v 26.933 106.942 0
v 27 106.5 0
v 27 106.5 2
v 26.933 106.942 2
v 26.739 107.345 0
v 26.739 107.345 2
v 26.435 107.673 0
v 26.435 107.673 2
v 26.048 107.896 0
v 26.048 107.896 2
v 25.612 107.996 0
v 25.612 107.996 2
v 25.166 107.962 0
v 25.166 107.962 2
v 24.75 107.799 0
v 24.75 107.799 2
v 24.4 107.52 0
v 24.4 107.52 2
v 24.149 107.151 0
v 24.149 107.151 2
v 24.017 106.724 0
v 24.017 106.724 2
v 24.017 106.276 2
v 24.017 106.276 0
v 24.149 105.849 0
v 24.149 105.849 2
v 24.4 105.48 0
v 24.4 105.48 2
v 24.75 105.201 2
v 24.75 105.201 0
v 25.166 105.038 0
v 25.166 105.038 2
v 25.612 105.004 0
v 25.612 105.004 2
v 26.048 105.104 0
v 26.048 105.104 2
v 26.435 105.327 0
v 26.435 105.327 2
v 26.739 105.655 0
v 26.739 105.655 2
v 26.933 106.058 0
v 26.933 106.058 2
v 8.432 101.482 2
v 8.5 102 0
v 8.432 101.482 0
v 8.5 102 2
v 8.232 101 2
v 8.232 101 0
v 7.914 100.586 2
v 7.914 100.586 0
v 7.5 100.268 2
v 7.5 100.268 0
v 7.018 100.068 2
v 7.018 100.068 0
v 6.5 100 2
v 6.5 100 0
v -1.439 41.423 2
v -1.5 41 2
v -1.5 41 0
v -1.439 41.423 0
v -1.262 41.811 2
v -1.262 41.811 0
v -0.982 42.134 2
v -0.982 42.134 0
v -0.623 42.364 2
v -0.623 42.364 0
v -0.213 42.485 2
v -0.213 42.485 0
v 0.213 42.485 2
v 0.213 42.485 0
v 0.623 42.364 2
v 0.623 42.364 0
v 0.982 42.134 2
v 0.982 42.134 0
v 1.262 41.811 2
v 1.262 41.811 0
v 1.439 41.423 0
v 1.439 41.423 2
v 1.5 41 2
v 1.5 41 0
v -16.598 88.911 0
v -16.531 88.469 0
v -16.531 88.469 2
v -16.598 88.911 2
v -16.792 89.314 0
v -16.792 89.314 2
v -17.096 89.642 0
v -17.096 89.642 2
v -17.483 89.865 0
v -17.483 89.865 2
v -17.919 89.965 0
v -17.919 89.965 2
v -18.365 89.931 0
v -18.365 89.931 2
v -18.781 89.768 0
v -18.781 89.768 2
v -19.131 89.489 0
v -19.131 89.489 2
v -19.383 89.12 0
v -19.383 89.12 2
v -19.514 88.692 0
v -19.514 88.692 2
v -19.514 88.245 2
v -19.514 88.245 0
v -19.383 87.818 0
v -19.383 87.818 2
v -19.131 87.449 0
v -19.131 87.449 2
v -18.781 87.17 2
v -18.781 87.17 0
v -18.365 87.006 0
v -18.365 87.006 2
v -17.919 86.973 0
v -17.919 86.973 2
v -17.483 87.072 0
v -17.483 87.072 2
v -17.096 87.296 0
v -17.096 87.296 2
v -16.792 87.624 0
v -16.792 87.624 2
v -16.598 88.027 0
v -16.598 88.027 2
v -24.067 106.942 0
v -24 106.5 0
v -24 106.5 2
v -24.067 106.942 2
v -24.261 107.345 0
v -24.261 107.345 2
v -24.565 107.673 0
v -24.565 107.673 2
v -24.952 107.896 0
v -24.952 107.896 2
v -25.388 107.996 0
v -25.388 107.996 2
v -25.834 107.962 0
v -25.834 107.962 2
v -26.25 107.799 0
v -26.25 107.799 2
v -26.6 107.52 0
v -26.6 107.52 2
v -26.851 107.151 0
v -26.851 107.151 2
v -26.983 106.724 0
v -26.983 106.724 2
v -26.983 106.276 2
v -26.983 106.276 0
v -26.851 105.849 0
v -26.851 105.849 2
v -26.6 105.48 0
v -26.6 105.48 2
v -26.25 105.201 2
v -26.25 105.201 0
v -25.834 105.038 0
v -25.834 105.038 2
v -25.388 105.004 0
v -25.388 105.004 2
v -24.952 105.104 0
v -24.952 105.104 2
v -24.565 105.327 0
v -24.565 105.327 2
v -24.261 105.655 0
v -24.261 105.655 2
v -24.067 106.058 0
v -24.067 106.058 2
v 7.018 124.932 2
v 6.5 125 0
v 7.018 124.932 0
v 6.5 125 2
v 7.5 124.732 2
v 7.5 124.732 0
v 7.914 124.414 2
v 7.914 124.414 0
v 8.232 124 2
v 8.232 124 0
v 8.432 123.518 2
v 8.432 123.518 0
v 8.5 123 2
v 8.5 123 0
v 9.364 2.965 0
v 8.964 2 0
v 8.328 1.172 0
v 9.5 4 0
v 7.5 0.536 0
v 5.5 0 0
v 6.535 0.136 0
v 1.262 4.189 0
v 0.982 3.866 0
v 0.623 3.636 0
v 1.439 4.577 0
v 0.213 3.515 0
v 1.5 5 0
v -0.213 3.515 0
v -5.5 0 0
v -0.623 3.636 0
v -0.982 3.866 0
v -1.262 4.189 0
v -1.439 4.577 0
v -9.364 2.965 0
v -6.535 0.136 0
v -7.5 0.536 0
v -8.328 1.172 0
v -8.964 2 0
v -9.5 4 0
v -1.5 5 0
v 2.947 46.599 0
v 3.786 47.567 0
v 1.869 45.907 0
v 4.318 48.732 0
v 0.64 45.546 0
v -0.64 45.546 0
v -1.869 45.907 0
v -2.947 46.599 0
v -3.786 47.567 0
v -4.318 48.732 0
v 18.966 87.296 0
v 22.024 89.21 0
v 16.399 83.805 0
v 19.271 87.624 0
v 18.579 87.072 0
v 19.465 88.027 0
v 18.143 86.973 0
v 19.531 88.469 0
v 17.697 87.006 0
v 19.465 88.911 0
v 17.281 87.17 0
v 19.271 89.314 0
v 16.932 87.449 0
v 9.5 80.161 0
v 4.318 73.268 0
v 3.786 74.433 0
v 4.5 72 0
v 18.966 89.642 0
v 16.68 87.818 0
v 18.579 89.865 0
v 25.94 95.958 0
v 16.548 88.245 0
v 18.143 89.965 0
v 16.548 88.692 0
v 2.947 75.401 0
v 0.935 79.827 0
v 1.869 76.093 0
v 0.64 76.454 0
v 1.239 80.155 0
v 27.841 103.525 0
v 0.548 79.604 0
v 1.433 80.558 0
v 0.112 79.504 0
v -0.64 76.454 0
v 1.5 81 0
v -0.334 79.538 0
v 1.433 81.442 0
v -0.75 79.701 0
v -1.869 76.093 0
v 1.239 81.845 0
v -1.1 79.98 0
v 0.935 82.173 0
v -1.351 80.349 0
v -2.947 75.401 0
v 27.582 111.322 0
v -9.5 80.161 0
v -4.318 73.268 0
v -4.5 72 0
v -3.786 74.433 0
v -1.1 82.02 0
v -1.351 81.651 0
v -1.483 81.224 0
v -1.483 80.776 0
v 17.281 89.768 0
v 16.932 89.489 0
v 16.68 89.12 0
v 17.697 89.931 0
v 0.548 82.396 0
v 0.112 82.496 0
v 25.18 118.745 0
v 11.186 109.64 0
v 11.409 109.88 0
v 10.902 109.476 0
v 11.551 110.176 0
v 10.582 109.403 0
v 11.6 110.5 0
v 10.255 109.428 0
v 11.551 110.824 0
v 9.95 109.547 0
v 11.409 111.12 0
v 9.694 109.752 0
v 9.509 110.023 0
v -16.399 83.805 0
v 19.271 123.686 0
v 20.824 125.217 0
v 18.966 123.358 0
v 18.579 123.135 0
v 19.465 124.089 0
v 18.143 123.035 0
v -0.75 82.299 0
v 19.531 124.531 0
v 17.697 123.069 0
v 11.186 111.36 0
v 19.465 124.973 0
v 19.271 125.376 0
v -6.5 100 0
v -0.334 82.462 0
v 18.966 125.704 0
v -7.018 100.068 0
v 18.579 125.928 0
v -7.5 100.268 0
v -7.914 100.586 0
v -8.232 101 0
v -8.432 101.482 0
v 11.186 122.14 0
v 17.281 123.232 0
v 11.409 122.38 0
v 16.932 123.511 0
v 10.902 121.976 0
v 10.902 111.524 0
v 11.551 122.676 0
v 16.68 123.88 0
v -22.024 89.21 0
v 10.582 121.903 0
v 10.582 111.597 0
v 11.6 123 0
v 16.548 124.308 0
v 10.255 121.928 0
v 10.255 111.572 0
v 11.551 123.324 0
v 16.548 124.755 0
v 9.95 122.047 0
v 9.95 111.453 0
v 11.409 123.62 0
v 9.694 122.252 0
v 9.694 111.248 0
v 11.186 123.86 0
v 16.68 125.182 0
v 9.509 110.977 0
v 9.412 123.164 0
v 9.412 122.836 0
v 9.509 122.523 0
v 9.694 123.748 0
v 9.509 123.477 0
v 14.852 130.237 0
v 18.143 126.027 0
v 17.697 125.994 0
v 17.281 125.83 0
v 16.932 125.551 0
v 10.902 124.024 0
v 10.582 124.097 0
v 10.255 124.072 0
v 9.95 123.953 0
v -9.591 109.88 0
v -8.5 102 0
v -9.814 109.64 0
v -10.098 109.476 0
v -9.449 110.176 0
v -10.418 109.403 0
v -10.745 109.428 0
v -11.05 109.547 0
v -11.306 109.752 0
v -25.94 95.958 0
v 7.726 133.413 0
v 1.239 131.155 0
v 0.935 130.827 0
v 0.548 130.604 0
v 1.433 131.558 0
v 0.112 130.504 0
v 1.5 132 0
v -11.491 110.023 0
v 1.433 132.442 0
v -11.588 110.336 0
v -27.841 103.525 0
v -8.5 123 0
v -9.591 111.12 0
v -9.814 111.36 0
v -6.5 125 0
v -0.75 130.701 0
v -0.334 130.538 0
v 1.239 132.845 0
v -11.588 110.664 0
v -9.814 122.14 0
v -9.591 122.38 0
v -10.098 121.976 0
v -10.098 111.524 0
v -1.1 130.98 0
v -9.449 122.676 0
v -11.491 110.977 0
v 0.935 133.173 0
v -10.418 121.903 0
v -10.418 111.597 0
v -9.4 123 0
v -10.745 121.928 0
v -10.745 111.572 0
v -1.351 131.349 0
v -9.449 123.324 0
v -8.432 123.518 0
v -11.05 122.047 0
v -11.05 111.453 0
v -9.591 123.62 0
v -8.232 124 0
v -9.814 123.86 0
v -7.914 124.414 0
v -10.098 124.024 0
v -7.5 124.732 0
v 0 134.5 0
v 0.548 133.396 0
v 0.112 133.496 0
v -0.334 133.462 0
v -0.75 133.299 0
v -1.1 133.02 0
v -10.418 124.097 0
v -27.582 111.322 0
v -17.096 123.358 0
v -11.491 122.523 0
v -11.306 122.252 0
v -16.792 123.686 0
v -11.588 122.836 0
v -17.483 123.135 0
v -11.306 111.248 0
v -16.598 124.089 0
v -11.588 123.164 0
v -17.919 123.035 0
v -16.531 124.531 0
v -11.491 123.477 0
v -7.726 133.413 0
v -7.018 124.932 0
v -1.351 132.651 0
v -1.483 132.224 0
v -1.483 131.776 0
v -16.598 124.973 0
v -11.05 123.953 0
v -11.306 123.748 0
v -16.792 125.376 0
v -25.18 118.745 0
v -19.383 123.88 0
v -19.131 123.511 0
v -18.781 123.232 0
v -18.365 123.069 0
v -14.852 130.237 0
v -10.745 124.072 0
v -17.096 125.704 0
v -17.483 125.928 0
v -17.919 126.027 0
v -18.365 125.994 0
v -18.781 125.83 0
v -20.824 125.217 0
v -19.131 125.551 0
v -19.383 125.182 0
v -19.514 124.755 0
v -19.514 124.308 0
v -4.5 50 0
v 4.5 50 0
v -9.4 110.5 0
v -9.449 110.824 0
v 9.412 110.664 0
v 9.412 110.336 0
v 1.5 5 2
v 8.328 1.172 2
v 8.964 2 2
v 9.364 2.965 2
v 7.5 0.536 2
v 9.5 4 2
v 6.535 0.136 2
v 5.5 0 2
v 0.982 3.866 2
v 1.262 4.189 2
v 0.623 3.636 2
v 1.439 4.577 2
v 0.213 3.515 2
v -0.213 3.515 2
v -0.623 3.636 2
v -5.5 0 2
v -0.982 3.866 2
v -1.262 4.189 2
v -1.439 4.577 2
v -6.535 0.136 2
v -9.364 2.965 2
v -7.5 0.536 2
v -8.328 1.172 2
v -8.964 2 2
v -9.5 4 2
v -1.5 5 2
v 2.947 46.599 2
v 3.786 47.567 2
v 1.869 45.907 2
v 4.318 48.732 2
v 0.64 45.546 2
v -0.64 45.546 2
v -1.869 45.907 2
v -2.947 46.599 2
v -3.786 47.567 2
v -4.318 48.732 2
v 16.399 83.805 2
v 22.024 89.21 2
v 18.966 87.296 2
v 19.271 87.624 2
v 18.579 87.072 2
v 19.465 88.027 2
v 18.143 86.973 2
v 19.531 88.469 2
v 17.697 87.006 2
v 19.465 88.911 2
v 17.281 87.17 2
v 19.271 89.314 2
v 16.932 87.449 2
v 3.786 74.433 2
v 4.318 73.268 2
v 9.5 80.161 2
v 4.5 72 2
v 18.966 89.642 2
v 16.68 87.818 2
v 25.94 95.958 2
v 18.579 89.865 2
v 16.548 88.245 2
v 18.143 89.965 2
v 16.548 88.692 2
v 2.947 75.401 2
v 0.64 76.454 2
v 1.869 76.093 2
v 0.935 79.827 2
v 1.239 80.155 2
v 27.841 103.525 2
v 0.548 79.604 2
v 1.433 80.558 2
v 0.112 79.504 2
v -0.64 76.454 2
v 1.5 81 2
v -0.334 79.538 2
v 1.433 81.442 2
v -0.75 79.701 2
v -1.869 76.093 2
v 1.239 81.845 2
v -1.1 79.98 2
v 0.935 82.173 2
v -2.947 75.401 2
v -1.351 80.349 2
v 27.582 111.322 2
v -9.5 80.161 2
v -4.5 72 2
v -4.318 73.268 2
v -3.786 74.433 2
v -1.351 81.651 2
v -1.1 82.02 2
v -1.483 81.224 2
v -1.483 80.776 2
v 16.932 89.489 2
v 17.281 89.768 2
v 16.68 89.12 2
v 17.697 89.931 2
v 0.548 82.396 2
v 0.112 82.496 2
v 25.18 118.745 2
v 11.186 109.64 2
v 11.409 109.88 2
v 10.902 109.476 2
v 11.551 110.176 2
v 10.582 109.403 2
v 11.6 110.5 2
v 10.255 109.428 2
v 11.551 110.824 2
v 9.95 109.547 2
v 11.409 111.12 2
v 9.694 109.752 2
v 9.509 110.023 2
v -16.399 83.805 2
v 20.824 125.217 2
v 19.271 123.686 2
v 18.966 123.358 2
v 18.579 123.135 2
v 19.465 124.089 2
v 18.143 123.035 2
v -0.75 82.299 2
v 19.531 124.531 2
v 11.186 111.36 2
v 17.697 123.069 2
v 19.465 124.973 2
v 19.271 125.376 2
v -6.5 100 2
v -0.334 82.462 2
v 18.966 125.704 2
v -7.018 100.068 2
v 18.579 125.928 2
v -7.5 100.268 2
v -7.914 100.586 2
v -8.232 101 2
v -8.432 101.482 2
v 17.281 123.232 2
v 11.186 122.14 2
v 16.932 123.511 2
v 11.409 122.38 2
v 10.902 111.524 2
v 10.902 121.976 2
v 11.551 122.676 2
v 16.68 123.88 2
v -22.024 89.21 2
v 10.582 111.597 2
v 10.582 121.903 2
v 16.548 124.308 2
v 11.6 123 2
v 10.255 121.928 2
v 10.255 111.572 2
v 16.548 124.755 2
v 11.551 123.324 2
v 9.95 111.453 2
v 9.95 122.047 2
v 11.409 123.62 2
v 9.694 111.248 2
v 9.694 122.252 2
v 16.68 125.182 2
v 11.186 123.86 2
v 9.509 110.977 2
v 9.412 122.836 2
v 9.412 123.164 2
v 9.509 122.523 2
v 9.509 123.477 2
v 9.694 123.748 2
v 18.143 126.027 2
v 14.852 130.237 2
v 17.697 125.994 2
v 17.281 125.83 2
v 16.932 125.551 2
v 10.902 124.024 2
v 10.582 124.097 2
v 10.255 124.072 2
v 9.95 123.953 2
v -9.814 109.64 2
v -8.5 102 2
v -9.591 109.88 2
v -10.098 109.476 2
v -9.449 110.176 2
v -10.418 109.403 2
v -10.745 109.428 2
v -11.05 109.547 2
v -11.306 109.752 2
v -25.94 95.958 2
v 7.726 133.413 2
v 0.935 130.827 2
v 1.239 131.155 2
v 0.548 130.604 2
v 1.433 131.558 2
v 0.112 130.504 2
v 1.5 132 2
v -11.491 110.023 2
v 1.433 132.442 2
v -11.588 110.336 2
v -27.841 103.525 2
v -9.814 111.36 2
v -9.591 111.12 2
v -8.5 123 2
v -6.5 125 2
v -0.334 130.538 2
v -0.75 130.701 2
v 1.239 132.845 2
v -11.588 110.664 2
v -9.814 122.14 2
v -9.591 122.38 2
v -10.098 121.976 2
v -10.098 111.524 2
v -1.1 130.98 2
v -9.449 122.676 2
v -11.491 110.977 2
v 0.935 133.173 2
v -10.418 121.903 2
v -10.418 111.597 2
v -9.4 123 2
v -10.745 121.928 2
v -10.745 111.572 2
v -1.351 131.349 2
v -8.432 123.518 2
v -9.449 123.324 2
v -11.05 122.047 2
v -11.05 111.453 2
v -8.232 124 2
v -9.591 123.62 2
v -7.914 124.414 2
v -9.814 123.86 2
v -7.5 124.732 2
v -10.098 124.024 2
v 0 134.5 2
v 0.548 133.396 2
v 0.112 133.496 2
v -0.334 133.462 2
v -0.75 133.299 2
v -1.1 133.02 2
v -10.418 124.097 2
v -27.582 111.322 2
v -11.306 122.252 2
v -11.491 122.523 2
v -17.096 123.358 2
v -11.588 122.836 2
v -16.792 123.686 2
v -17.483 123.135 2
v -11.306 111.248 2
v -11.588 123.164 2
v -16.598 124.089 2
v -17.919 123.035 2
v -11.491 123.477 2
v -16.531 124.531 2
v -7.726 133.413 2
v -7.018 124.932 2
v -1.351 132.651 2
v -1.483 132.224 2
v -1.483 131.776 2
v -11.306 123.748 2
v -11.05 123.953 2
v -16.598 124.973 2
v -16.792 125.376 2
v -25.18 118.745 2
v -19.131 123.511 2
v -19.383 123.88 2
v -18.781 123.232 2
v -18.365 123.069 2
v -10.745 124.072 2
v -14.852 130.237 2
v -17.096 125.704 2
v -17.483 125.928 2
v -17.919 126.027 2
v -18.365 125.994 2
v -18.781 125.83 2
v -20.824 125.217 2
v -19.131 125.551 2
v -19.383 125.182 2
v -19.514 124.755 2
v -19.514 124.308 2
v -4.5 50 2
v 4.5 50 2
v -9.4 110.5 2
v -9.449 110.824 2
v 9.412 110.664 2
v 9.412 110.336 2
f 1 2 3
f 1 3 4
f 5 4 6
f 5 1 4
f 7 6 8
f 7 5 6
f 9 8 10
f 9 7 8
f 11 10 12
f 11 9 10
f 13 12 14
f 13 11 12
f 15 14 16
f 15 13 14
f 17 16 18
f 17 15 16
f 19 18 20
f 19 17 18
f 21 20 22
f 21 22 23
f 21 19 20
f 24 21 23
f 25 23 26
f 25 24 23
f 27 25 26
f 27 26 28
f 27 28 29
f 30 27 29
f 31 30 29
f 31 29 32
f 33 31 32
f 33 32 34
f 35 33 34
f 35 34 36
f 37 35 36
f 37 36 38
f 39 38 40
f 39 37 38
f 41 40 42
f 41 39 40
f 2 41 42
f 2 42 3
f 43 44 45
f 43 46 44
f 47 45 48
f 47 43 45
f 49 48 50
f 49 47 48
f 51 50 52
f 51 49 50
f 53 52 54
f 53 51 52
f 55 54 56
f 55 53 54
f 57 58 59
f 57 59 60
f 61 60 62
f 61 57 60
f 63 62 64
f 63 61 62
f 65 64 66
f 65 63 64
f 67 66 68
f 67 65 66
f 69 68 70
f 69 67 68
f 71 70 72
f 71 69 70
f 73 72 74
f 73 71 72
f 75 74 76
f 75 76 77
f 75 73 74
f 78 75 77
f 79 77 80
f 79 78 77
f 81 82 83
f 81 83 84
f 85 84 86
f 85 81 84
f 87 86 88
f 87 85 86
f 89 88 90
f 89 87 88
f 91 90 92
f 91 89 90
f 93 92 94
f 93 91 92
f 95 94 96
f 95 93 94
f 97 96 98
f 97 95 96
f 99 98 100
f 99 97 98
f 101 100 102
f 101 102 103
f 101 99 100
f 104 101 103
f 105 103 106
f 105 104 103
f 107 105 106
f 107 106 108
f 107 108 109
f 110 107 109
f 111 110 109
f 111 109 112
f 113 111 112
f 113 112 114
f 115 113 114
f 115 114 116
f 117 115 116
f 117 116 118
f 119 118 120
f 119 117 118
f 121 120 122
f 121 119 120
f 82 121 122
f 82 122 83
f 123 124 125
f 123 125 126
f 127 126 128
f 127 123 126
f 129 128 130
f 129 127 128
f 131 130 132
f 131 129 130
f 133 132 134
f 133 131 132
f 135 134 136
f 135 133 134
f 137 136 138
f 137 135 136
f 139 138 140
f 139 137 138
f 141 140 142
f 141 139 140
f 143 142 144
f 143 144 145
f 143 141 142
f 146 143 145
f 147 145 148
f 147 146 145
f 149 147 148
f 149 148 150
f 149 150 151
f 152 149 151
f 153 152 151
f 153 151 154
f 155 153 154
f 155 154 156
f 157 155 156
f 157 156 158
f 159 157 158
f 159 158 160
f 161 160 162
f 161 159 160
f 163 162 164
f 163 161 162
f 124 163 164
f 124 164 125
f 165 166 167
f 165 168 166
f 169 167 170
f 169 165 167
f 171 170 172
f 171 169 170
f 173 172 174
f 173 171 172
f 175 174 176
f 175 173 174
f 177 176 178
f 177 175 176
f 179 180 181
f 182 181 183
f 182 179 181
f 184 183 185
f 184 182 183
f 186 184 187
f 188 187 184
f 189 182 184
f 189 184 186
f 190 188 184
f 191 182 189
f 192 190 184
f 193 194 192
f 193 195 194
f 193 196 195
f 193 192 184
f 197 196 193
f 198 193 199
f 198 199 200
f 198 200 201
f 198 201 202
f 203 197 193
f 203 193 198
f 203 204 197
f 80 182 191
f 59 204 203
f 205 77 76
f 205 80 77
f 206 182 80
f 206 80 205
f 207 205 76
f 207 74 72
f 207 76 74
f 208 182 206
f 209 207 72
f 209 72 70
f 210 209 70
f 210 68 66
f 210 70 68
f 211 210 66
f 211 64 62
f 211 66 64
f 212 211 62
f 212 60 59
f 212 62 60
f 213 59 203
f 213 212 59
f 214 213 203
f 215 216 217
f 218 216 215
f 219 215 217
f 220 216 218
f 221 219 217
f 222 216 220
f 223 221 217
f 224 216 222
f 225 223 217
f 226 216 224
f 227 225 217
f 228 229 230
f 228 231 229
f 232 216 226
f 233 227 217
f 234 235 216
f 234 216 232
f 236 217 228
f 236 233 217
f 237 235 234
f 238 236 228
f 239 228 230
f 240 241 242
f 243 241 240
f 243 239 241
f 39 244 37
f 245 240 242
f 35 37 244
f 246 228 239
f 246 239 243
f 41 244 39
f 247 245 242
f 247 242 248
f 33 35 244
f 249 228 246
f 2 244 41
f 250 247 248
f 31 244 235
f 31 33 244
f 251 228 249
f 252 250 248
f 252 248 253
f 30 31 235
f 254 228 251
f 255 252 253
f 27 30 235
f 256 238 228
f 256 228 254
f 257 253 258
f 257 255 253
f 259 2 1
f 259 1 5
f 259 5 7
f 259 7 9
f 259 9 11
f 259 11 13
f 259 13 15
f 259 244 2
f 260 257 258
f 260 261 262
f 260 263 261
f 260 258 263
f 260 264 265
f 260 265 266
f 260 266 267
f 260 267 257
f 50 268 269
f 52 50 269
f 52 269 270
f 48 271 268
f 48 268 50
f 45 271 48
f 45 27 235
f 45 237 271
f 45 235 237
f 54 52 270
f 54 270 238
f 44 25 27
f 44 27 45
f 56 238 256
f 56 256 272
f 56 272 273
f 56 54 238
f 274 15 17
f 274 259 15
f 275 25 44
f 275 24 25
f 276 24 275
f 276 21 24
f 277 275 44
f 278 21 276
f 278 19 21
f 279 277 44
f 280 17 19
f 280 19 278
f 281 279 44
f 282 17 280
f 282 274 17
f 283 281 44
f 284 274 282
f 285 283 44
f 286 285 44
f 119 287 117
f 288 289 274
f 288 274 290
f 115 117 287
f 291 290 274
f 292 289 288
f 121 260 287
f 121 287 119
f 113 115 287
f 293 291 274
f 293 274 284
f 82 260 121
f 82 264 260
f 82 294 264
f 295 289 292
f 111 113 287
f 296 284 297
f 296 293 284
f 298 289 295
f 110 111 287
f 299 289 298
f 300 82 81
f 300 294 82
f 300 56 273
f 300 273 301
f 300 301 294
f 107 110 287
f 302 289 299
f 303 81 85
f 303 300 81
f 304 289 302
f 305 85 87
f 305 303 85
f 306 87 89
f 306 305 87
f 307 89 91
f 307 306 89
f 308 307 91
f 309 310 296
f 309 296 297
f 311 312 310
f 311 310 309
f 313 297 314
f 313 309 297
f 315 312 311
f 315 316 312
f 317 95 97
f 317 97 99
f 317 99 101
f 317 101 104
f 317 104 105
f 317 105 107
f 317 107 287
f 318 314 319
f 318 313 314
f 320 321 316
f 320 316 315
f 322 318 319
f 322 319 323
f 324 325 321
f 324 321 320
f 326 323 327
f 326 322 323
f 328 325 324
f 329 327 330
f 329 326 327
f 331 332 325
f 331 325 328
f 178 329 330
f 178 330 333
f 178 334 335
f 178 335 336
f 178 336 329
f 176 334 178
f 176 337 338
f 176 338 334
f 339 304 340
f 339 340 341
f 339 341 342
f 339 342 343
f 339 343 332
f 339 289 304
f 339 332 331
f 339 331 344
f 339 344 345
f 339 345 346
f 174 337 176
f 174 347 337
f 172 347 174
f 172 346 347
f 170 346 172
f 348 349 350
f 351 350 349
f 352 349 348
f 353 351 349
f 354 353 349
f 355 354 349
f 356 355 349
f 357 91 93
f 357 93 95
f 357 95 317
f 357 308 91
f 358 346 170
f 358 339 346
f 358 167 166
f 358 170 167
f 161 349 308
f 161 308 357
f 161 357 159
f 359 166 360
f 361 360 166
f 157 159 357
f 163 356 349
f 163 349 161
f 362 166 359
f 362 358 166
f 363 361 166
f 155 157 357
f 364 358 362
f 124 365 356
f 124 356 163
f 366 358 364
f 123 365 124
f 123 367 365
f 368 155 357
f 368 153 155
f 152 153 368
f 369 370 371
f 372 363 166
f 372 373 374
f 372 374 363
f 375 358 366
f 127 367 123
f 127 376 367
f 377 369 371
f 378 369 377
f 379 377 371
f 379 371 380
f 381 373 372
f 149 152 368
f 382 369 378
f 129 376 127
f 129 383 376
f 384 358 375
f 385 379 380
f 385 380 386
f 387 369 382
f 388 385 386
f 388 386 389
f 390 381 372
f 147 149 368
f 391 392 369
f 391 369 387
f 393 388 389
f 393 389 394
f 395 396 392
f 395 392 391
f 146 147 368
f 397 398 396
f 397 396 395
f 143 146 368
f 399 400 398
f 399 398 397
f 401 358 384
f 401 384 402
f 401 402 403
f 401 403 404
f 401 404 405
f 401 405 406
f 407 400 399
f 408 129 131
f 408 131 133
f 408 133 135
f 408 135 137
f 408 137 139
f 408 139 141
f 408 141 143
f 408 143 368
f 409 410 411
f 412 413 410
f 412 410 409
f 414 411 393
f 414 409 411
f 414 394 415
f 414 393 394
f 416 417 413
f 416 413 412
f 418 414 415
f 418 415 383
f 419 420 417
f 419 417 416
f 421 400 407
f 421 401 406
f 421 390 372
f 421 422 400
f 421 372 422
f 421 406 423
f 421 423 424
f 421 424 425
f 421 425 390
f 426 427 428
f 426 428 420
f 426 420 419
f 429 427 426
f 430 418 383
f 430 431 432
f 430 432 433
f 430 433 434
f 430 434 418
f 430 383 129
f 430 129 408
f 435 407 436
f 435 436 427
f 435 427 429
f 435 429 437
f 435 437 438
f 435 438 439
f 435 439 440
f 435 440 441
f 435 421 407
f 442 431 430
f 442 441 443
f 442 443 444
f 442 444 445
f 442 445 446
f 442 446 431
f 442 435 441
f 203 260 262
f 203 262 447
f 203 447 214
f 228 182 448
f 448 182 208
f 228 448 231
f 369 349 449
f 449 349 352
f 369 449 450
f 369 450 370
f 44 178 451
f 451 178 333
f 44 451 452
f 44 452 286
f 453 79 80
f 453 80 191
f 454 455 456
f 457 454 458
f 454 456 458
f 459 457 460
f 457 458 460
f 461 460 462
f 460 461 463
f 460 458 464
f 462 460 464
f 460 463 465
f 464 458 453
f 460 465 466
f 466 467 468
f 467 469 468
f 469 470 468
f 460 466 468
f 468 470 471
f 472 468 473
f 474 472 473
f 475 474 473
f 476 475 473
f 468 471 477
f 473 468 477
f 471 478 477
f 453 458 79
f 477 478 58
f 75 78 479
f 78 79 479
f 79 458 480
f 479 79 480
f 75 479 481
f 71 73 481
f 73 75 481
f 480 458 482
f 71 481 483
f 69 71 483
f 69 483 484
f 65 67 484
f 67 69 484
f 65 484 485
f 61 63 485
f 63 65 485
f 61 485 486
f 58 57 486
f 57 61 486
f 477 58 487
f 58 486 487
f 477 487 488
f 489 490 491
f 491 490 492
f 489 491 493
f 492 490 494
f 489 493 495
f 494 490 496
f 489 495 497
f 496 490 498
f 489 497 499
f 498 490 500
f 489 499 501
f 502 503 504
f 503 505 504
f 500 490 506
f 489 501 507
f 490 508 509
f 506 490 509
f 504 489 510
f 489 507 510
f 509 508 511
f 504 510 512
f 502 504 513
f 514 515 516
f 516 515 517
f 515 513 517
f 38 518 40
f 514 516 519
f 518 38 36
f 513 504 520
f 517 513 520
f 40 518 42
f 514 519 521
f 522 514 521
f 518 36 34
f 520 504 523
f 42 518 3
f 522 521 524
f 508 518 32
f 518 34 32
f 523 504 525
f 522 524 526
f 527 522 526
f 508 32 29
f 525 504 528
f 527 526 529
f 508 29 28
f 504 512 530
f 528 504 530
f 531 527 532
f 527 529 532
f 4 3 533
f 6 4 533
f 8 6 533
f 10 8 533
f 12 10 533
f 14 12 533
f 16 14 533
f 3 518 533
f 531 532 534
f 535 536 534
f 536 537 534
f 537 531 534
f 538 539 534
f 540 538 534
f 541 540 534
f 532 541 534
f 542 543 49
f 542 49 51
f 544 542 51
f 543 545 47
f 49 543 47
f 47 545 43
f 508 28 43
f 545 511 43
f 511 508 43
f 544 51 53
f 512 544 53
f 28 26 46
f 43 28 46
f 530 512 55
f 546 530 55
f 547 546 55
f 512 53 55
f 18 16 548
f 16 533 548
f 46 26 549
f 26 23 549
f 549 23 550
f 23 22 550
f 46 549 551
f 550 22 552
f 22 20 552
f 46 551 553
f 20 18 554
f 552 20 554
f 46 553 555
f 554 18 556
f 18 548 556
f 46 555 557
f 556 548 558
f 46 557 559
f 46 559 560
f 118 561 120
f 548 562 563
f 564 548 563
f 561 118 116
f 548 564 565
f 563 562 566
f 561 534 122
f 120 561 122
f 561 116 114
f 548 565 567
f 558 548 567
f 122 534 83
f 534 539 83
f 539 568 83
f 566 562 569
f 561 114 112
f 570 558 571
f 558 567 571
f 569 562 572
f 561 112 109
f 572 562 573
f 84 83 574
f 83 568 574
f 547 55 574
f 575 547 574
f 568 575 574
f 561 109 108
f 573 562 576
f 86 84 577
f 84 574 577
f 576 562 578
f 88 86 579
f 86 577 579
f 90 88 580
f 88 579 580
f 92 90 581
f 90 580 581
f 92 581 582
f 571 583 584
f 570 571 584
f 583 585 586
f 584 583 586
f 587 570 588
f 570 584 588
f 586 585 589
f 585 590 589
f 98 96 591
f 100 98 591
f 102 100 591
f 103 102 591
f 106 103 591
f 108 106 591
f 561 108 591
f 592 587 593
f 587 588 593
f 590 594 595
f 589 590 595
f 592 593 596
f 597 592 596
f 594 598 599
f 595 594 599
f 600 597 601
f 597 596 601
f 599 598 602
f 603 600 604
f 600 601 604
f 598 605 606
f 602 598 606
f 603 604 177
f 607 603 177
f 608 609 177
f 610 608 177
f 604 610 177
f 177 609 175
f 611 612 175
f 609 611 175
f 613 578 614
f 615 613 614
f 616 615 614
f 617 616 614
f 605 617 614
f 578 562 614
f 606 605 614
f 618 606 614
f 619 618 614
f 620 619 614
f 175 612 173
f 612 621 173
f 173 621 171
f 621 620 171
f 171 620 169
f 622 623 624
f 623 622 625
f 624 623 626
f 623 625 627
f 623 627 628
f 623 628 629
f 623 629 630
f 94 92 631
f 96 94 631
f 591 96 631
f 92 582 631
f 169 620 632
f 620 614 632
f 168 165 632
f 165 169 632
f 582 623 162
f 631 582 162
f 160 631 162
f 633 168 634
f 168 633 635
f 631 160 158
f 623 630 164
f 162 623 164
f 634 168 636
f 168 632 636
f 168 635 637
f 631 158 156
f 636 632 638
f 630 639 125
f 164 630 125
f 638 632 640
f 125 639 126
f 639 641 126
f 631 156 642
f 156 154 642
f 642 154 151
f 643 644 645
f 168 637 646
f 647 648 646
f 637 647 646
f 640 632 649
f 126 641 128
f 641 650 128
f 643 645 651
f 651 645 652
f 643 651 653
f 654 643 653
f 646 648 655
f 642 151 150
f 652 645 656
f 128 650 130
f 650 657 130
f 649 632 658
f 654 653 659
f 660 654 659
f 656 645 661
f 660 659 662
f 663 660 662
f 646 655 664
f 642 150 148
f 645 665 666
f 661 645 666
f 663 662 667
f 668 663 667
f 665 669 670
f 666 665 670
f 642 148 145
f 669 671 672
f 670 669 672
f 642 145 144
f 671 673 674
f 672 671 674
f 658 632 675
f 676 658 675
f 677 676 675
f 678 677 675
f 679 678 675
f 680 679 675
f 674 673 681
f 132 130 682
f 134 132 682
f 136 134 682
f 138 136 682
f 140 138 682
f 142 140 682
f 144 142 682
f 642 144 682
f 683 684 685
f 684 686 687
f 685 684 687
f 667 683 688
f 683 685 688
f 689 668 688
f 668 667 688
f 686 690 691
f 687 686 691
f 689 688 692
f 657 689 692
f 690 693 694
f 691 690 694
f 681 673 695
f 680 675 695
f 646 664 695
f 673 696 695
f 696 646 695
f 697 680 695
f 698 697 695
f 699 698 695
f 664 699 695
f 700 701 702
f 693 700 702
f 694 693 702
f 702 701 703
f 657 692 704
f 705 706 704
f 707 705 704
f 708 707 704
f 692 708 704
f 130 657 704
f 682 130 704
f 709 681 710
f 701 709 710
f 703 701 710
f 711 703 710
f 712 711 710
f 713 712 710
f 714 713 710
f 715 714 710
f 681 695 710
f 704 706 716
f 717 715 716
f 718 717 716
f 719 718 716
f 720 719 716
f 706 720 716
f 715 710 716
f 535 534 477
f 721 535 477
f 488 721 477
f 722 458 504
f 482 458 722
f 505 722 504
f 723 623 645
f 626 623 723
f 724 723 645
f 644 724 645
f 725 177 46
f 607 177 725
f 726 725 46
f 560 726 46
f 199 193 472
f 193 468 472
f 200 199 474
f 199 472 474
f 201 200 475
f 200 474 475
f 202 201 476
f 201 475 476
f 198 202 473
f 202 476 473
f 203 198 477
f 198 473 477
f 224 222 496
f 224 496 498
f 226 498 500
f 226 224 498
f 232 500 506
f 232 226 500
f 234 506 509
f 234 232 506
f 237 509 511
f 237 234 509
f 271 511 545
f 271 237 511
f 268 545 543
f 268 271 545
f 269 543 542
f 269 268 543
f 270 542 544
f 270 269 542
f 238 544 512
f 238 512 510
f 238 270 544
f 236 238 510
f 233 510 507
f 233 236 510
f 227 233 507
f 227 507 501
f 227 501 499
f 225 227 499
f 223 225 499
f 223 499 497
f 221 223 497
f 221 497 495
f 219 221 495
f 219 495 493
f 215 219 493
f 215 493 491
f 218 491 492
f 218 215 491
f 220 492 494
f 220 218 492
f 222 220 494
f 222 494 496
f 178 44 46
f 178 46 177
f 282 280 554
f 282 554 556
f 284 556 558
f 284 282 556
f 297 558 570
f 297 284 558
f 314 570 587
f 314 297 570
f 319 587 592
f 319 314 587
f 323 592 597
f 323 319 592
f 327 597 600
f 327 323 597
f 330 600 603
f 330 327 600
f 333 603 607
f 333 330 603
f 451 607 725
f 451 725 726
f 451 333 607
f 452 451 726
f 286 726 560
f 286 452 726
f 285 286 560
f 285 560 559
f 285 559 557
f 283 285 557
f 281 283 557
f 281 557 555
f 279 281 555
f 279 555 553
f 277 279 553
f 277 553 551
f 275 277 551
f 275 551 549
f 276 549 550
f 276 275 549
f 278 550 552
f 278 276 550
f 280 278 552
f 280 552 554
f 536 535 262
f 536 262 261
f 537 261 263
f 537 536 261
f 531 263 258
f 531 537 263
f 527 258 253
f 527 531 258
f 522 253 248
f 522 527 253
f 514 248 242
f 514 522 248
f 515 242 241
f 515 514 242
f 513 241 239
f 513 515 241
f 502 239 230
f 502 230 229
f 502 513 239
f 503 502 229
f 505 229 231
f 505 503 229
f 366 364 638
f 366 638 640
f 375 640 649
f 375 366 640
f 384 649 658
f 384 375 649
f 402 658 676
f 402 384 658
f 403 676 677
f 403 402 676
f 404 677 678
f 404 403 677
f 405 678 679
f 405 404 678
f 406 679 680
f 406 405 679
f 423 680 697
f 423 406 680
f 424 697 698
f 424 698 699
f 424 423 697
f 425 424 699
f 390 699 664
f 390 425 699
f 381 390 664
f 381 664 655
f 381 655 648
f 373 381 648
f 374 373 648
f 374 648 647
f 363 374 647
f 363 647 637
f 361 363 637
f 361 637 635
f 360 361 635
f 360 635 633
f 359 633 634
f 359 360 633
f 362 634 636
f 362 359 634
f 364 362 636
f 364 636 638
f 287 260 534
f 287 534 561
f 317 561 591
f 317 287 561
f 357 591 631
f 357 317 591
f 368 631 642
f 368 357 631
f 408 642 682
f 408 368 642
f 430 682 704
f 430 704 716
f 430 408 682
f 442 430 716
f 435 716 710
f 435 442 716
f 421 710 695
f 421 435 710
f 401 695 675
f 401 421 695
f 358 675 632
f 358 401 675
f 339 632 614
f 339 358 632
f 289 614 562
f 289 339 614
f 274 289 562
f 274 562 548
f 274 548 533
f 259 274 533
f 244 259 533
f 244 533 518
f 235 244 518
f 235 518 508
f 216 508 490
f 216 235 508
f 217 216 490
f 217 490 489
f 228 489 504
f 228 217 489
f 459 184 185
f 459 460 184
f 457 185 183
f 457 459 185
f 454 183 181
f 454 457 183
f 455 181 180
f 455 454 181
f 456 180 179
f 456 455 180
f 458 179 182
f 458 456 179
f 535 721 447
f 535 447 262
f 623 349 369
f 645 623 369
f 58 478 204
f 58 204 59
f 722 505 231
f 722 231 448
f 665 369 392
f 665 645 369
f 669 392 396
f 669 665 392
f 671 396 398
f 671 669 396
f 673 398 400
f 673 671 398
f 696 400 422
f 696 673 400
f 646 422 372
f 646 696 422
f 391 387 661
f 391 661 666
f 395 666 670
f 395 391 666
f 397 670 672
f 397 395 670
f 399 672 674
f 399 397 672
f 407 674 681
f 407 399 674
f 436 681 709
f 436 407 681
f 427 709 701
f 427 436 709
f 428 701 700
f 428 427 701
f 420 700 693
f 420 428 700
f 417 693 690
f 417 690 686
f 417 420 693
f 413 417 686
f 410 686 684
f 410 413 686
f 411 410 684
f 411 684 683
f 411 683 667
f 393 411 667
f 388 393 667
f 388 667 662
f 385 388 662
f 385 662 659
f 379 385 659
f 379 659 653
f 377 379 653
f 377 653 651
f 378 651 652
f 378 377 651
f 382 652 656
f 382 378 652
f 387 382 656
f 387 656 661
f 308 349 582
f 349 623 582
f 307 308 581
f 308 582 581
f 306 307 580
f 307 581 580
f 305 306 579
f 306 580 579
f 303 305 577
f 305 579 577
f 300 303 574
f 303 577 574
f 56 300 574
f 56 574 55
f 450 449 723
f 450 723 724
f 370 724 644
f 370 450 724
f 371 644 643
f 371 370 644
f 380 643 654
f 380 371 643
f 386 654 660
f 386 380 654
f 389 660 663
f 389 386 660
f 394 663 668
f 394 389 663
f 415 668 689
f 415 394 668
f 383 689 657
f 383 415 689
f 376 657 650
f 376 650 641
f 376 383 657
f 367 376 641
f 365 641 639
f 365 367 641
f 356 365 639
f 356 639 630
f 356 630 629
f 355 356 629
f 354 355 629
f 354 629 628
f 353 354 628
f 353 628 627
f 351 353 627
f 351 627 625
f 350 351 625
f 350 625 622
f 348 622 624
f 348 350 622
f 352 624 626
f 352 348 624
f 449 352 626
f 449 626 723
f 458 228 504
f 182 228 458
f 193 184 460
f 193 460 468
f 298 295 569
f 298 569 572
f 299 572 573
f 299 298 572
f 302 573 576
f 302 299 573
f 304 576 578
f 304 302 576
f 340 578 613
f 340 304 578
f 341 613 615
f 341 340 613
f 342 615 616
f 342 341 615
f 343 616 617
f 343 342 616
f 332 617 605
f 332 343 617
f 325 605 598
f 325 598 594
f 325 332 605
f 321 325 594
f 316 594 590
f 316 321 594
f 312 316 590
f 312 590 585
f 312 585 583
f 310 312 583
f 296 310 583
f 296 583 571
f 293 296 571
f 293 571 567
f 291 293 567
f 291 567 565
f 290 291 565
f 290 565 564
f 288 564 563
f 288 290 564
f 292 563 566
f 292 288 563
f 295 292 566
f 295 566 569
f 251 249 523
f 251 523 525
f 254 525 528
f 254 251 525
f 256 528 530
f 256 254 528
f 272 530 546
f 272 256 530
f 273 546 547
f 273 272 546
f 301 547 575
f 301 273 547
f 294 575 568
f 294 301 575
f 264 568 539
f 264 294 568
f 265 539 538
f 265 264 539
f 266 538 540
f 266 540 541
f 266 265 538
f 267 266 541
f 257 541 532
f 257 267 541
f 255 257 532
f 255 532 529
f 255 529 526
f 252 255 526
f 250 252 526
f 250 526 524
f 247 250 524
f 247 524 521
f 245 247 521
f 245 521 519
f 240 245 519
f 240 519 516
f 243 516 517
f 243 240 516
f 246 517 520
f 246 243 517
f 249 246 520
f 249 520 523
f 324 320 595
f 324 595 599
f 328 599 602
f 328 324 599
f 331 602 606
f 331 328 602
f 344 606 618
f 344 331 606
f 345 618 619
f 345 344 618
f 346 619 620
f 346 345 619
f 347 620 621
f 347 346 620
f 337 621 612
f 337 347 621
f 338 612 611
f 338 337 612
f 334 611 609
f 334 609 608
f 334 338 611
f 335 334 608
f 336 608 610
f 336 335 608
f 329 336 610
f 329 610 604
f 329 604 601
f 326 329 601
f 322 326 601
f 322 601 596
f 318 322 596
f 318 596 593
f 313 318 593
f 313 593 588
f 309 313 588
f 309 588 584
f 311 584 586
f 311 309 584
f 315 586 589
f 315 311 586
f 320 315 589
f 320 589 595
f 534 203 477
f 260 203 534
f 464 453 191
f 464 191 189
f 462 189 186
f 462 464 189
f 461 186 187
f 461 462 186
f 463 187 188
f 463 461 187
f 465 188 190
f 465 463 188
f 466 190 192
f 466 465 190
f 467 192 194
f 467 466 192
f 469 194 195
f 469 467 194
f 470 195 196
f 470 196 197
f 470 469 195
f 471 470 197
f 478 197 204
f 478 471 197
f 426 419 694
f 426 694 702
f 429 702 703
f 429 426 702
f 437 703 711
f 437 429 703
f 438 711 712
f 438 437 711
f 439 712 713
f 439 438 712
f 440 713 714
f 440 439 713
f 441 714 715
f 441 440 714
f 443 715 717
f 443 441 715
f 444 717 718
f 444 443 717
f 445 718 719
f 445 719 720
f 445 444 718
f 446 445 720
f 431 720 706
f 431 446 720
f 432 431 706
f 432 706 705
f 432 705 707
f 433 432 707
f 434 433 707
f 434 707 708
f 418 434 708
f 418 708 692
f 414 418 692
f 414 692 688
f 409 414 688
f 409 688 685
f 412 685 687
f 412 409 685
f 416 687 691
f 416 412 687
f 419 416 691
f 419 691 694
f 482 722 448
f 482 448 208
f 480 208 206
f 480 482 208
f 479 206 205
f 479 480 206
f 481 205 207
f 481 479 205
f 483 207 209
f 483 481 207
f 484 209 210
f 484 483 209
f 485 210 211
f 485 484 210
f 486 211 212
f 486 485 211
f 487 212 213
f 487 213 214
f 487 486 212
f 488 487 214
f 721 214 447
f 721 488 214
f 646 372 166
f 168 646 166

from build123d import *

# Parameters (mm, degrees)
ESQUISSE1_R             = 1.1
ESQUISSE1_R_2           = 1.5
ESQUISSE1_W             = 17
ESQUISSE1_H             = 25
BOSS_EXTRU_1_DEPTH      = 2
CONG_1_R                = 2
ENL_V_MAT_EXTRU_1_DEPTH = 2
CONG_2_R                = 4


with BuildPart() as part:
    # Esquisse1 → Boss.-Extru.1 (new body)
    with BuildSketch(Plane.XY):
        with BuildLine():
            Line((9.5, 0), (-9.5, 0))
            Line((-9.5, 0), (-9.5, 80.160865618))
            ThreePointArc((-9.5, 80.160865618), (0, 134.5), (9.5, 80.160865618))
            Line((9.5, 80.160865618), (9.5, 0))
        make_face()
        with Locations((-10.5, 123)):
            Circle(ESQUISSE1_R, mode=Mode.SUBTRACT)
        with Locations((-10.5, 110.5)):
            Circle(ESQUISSE1_R, mode=Mode.SUBTRACT)
        with Locations((10.5, 110.5)):
            Circle(ESQUISSE1_R, mode=Mode.SUBTRACT)
        with Locations((10.5, 123)):
            Circle(ESQUISSE1_R, mode=Mode.SUBTRACT)
        with Locations((0, 132)):
            Circle(ESQUISSE1_R_2, mode=Mode.SUBTRACT)
        with Locations((18.03122292, 124.53122292)):
            Circle(ESQUISSE1_R_2, mode=Mode.SUBTRACT)
        with Locations((25.5, 106.5)):
            Circle(ESQUISSE1_R_2, mode=Mode.SUBTRACT)
        with Locations((18.03122292, 88.46877708)):
            Circle(ESQUISSE1_R_2, mode=Mode.SUBTRACT)
        with Locations((0, 81)):
            Circle(ESQUISSE1_R_2, mode=Mode.SUBTRACT)
        with Locations((-18.03122292, 88.46877708)):
            Circle(ESQUISSE1_R_2, mode=Mode.SUBTRACT)
        with Locations((-25.5, 106.5)):
            Circle(ESQUISSE1_R_2, mode=Mode.SUBTRACT)
        with Locations((-18.03122292, 124.53122292)):
            Circle(ESQUISSE1_R_2, mode=Mode.SUBTRACT)
        with Locations((0, 112.5)):
            Rectangle(ESQUISSE1_W, ESQUISSE1_H, mode=Mode.SUBTRACT)
    extrude(amount=BOSS_EXTRU_1_DEPTH)

    # Congé1
    cong_1_edges = [part.edges().sort_by_distance(p)[0] for p in [
        (-8.5, 125, 1),
        (-8.5, 100, 1),
        (8.5, 100, 1),
        (8.5, 125, 1),
    ]]
    fillet(cong_1_edges, radius=CONG_1_R)

    # Esquisse2 → Enlèv. mat.-Extru.1 (cut)
    with BuildSketch(Plane.XY.offset(2)):
        with BuildLine():
            Line((4.5, 72), (4.5, 50))
            ThreePointArc((4.5, 50), (0, 45.5), (-4.5, 50))
            Line((-4.5, 50), (-4.5, 72))
            ThreePointArc((-4.5, 72), (0, 76.5), (4.5, 72))
        make_face()
        with BuildLine():
            Line((1.5, 41), (1.5, 5))
            ThreePointArc((1.5, 5), (0, 3.5), (-1.5, 5))
            Line((-1.5, 5), (-1.5, 41))
            ThreePointArc((-1.5, 41), (0, 42.5), (1.5, 41))
        make_face()
    extrude(amount=-ENL_V_MAT_EXTRU_1_DEPTH, mode=Mode.SUBTRACT)

    # Congé2
    cong_2_edges = [part.edges().sort_by_distance(p)[0] for p in [
        (9.5, 0, 1),
        (-9.5, 0, 1),
    ]]
    fillet(cong_2_edges, radius=CONG_2_R)


solid = part.part
